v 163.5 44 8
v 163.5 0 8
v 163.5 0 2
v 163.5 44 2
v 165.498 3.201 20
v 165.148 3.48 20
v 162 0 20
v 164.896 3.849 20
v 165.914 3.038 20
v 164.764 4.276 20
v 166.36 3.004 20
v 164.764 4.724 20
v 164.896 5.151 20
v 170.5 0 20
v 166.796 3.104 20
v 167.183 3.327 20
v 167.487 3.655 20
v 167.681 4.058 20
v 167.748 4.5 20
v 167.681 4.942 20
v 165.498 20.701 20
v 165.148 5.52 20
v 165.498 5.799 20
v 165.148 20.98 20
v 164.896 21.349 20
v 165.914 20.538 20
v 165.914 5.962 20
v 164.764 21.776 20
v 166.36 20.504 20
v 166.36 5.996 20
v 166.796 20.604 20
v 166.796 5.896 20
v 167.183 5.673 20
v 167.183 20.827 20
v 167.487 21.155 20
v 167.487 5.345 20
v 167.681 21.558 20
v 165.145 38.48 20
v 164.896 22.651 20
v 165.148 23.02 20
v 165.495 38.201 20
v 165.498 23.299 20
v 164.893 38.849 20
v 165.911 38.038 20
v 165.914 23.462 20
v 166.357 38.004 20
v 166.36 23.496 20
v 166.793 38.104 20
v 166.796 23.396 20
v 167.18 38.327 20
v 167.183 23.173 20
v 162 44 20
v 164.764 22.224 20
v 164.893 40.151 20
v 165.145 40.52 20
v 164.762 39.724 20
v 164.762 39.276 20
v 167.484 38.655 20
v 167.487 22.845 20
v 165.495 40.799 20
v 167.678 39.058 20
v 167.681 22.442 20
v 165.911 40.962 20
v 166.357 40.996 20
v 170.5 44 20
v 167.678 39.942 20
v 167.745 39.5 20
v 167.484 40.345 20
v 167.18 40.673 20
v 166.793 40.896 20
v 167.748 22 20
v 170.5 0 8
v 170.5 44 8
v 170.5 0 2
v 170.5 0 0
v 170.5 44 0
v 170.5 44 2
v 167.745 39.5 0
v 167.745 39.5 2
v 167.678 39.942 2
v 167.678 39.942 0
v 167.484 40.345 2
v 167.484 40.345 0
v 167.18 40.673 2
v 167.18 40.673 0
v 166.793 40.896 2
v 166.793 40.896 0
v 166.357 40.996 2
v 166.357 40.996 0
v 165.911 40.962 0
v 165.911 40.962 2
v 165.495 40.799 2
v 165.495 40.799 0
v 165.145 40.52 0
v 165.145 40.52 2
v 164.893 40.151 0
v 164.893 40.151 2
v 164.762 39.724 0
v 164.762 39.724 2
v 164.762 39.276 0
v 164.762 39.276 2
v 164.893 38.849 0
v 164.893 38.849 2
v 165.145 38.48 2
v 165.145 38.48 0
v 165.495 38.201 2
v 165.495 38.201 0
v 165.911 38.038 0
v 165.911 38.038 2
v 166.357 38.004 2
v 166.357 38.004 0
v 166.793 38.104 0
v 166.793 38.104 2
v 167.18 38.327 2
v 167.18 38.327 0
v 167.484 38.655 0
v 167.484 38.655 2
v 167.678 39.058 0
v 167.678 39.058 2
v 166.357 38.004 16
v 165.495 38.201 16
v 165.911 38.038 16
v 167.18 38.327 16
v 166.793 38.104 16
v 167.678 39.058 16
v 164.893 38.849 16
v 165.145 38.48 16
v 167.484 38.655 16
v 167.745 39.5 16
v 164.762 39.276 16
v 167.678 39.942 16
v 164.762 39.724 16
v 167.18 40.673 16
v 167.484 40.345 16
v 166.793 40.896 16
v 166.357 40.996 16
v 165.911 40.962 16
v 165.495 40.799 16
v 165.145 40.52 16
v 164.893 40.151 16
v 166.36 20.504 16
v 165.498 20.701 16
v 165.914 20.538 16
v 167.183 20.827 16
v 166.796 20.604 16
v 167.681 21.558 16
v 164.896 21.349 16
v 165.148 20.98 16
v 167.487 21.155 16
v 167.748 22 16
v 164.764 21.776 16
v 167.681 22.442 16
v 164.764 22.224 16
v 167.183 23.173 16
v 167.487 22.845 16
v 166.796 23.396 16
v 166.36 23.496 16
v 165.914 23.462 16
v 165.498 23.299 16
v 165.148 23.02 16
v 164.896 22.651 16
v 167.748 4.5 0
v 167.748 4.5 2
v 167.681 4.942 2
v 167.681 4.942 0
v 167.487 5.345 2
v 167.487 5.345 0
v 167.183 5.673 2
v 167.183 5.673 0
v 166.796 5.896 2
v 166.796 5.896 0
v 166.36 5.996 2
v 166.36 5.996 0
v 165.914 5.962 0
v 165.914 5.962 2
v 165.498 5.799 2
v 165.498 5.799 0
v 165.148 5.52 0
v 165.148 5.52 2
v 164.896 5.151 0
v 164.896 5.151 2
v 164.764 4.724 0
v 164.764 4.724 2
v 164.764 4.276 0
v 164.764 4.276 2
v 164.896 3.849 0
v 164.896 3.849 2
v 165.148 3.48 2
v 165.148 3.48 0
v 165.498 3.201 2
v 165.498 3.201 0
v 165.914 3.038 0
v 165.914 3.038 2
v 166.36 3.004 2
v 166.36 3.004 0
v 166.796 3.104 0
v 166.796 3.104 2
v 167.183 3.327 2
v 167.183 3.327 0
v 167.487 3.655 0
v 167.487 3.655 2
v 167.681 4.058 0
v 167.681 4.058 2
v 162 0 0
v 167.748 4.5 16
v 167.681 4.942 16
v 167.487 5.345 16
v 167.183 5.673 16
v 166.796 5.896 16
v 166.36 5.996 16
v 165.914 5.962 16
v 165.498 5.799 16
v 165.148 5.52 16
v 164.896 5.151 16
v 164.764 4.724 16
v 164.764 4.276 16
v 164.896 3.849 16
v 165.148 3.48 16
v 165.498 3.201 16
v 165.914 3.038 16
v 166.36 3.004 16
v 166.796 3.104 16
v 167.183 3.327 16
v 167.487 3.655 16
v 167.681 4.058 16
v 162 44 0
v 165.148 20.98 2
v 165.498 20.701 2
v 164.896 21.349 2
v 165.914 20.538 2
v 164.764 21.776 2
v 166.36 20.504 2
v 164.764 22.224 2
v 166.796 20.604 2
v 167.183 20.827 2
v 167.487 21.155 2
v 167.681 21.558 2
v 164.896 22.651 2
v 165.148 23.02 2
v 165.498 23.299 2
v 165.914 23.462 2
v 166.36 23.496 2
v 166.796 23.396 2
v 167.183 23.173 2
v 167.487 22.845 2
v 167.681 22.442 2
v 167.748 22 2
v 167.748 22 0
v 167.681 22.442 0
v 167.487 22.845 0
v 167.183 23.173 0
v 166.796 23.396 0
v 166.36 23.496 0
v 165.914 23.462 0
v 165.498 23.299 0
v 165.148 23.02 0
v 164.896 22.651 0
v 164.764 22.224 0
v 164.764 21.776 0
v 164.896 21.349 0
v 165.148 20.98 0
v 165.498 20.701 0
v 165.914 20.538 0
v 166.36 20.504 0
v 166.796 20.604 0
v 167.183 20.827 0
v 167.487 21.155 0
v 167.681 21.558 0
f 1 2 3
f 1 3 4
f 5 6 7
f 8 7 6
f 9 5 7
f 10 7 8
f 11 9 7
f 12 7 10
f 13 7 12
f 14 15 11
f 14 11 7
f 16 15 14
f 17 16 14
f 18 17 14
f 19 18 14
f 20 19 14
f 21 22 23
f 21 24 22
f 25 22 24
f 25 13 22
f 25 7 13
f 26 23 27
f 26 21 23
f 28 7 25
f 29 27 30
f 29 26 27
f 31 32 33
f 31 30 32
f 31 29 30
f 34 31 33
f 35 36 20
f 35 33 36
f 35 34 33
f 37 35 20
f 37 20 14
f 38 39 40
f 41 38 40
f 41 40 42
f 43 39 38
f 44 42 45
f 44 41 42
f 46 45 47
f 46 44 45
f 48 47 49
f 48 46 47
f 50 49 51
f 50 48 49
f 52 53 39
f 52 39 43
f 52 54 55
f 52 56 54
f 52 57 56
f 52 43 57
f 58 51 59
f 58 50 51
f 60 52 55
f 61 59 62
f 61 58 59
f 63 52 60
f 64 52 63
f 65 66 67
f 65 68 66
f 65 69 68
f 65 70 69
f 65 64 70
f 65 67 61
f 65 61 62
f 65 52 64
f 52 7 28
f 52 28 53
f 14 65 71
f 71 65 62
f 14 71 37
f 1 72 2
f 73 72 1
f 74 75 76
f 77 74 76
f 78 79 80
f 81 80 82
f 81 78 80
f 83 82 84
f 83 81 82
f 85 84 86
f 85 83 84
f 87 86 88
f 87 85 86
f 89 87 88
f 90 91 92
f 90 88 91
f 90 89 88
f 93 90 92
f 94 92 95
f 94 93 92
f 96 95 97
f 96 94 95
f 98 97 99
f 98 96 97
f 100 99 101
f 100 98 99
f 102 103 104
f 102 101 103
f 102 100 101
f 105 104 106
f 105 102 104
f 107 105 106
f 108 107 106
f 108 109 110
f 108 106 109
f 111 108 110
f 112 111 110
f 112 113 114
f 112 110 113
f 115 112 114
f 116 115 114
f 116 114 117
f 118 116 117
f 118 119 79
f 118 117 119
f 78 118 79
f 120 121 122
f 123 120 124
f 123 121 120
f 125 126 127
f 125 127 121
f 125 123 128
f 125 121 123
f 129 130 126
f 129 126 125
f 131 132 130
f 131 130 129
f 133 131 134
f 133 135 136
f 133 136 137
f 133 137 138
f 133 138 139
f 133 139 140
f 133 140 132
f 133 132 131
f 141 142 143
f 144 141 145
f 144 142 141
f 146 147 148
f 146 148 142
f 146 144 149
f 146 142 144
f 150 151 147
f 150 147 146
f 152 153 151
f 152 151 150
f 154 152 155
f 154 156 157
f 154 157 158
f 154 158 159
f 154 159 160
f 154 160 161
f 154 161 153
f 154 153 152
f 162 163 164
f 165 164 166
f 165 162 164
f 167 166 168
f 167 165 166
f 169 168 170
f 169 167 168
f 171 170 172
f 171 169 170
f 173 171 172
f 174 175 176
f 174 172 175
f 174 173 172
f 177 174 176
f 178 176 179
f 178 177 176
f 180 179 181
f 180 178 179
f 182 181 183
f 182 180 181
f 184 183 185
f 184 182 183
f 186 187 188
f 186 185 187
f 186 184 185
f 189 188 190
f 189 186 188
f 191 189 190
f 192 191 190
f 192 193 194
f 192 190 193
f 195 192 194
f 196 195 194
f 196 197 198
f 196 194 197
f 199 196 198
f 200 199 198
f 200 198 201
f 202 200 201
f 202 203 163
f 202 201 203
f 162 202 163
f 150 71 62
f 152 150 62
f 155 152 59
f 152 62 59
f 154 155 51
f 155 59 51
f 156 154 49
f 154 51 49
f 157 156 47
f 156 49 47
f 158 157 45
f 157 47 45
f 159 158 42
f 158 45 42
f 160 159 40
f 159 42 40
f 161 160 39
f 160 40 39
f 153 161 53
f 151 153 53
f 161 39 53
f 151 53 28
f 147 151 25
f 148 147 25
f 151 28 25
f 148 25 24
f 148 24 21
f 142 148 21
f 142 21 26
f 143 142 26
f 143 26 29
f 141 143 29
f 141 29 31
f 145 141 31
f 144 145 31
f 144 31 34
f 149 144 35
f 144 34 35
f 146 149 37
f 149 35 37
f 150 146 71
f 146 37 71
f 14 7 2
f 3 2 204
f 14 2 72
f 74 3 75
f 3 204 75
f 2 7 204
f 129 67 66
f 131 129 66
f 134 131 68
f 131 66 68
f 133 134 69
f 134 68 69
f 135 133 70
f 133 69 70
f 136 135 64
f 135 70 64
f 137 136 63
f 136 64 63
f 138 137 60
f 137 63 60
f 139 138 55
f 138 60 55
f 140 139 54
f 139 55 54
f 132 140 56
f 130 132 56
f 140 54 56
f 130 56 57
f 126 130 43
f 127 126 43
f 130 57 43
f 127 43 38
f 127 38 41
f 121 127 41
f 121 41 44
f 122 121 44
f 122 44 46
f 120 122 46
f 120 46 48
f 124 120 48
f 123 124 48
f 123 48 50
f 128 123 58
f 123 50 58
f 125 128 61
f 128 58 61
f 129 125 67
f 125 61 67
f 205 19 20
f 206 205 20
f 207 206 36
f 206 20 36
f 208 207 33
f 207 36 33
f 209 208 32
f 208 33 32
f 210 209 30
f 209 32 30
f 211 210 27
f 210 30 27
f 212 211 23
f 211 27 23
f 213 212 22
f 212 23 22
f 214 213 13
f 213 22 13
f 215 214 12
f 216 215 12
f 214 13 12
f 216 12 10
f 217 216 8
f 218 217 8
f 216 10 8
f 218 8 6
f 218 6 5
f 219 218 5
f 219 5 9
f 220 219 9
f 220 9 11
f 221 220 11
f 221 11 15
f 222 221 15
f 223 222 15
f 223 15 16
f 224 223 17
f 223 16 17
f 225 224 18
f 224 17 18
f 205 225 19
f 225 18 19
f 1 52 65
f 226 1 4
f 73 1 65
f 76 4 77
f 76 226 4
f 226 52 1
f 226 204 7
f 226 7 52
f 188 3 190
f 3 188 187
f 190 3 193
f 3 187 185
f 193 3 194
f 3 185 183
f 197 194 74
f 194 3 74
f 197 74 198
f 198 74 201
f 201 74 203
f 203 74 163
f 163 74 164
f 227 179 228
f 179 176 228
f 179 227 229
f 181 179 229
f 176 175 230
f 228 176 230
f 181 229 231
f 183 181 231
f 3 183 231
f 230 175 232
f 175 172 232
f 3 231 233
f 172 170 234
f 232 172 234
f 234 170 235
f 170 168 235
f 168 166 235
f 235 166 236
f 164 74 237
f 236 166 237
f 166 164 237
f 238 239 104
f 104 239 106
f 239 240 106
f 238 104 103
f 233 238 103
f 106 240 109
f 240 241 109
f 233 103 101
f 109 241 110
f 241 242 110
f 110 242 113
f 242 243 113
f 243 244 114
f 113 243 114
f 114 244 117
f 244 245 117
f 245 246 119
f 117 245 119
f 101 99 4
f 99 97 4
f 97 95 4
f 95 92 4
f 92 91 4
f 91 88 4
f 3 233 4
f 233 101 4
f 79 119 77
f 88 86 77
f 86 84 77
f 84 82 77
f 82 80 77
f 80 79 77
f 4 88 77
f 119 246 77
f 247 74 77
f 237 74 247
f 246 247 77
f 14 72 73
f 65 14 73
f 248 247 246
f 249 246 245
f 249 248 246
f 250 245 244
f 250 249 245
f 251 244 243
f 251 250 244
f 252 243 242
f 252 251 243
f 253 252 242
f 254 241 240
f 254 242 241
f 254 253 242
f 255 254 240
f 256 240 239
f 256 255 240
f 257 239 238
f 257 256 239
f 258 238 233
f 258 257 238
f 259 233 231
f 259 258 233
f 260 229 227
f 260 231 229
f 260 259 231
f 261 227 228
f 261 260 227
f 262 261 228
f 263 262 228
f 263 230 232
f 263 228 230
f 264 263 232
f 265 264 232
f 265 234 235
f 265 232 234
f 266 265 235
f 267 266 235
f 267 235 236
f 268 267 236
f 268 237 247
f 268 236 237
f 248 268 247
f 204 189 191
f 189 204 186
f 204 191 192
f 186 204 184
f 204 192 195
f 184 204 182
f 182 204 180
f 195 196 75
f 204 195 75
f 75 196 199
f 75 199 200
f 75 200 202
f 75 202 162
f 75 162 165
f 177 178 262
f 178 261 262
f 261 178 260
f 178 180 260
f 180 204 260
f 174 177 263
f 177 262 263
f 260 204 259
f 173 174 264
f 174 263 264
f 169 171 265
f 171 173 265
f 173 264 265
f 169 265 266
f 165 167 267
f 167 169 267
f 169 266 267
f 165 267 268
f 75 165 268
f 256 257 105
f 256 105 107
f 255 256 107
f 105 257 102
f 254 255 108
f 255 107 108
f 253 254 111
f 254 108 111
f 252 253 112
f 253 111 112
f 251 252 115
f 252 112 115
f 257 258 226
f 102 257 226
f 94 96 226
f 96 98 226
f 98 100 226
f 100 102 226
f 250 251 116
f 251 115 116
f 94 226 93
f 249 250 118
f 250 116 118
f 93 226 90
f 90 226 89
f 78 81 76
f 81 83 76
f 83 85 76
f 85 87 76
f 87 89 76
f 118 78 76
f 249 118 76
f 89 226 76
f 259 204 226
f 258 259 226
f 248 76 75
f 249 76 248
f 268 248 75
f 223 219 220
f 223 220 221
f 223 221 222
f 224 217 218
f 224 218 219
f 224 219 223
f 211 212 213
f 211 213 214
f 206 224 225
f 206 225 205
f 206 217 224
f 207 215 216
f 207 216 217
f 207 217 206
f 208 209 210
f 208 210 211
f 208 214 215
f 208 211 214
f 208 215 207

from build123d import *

# Parameters (mm, degrees)
SKETCH040_W      = 11
SKETCH040_H      = 6
EXTRUDE014_DEPTH = 7
FILLET007_R      = 1
SKETCH031_W      = 8.5
SKETCH031_H      = 44
PAD003_DEPTH     = 20
SKETCH030_R      = 1.5
HOLE005_DEPTH    = 4
SKETCH033_R      = 1.5
HOLE007_DEPTH    = 4
SKETCH039_W      = 44
SKETCH039_H      = 6
POCKET001_DEPTH  = 7


with BuildPart() as part:
    # Sketch040 (on Face5 of Pocket001) → Extrude014 (new body)
    with BuildSketch(Plane.YZ.offset(163.5)):
        with Locations((30.5, 5)):
            Rectangle(SKETCH040_W, SKETCH040_H)
        with Locations((13.5, 5)):
            Rectangle(SKETCH040_W, SKETCH040_H)
    extrude(amount=EXTRUDE014_DEPTH)

    # Fillet007
    fillet007_edges = [part.edges().sort_by_distance(p)[0] for p in [
        (170.5, 8, 5),
        (170.5, 19, 5),
        (170.5, 36, 5),
        (170.5, 25, 5),
    ]]
    fillet(fillet007_edges, radius=FILLET007_R)

    # Sketch031 → Pad003 (new body)
    with BuildSketch(Plane.XY):
        with Locations((166.25, 22)):
            Rectangle(SKETCH031_W, SKETCH031_H)
    extrude(amount=PAD003_DEPTH)

    # Sketch030 → Hole005 (cut)
    with BuildSketch(Plane.XY):
        with Locations((166.244797, 39.500001)):
            Circle(SKETCH030_R)
        with Locations((166.247574, 22)):
            Circle(SKETCH030_R)
        with Locations((166.247574, 4.5)):
            Circle(SKETCH030_R)
    extrude(amount=HOLE005_DEPTH, mode=Mode.SUBTRACT)

    # Sketch033 (on Face5 of Hole005) → Hole007 (cut)
    with BuildSketch(Plane.XY.offset(20)):
        with Locations((166.244797, 39.500001)):
            Circle(SKETCH033_R)
        with Locations((166.247574, 22)):
            Circle(SKETCH033_R)
        with Locations((166.247574, 4.5)):
            Circle(SKETCH033_R)
    extrude(amount=-HOLE007_DEPTH, mode=Mode.SUBTRACT)

    # Sketch039 (on Face3 of Hole007) → Pocket001 (cut)
    with BuildSketch(Plane.YZ.offset(170.5)):
        with Locations((22, 5)):
            Rectangle(SKETCH039_W, SKETCH039_H)
    extrude(amount=-POCKET001_DEPTH, mode=Mode.SUBTRACT)


solid = part.part
